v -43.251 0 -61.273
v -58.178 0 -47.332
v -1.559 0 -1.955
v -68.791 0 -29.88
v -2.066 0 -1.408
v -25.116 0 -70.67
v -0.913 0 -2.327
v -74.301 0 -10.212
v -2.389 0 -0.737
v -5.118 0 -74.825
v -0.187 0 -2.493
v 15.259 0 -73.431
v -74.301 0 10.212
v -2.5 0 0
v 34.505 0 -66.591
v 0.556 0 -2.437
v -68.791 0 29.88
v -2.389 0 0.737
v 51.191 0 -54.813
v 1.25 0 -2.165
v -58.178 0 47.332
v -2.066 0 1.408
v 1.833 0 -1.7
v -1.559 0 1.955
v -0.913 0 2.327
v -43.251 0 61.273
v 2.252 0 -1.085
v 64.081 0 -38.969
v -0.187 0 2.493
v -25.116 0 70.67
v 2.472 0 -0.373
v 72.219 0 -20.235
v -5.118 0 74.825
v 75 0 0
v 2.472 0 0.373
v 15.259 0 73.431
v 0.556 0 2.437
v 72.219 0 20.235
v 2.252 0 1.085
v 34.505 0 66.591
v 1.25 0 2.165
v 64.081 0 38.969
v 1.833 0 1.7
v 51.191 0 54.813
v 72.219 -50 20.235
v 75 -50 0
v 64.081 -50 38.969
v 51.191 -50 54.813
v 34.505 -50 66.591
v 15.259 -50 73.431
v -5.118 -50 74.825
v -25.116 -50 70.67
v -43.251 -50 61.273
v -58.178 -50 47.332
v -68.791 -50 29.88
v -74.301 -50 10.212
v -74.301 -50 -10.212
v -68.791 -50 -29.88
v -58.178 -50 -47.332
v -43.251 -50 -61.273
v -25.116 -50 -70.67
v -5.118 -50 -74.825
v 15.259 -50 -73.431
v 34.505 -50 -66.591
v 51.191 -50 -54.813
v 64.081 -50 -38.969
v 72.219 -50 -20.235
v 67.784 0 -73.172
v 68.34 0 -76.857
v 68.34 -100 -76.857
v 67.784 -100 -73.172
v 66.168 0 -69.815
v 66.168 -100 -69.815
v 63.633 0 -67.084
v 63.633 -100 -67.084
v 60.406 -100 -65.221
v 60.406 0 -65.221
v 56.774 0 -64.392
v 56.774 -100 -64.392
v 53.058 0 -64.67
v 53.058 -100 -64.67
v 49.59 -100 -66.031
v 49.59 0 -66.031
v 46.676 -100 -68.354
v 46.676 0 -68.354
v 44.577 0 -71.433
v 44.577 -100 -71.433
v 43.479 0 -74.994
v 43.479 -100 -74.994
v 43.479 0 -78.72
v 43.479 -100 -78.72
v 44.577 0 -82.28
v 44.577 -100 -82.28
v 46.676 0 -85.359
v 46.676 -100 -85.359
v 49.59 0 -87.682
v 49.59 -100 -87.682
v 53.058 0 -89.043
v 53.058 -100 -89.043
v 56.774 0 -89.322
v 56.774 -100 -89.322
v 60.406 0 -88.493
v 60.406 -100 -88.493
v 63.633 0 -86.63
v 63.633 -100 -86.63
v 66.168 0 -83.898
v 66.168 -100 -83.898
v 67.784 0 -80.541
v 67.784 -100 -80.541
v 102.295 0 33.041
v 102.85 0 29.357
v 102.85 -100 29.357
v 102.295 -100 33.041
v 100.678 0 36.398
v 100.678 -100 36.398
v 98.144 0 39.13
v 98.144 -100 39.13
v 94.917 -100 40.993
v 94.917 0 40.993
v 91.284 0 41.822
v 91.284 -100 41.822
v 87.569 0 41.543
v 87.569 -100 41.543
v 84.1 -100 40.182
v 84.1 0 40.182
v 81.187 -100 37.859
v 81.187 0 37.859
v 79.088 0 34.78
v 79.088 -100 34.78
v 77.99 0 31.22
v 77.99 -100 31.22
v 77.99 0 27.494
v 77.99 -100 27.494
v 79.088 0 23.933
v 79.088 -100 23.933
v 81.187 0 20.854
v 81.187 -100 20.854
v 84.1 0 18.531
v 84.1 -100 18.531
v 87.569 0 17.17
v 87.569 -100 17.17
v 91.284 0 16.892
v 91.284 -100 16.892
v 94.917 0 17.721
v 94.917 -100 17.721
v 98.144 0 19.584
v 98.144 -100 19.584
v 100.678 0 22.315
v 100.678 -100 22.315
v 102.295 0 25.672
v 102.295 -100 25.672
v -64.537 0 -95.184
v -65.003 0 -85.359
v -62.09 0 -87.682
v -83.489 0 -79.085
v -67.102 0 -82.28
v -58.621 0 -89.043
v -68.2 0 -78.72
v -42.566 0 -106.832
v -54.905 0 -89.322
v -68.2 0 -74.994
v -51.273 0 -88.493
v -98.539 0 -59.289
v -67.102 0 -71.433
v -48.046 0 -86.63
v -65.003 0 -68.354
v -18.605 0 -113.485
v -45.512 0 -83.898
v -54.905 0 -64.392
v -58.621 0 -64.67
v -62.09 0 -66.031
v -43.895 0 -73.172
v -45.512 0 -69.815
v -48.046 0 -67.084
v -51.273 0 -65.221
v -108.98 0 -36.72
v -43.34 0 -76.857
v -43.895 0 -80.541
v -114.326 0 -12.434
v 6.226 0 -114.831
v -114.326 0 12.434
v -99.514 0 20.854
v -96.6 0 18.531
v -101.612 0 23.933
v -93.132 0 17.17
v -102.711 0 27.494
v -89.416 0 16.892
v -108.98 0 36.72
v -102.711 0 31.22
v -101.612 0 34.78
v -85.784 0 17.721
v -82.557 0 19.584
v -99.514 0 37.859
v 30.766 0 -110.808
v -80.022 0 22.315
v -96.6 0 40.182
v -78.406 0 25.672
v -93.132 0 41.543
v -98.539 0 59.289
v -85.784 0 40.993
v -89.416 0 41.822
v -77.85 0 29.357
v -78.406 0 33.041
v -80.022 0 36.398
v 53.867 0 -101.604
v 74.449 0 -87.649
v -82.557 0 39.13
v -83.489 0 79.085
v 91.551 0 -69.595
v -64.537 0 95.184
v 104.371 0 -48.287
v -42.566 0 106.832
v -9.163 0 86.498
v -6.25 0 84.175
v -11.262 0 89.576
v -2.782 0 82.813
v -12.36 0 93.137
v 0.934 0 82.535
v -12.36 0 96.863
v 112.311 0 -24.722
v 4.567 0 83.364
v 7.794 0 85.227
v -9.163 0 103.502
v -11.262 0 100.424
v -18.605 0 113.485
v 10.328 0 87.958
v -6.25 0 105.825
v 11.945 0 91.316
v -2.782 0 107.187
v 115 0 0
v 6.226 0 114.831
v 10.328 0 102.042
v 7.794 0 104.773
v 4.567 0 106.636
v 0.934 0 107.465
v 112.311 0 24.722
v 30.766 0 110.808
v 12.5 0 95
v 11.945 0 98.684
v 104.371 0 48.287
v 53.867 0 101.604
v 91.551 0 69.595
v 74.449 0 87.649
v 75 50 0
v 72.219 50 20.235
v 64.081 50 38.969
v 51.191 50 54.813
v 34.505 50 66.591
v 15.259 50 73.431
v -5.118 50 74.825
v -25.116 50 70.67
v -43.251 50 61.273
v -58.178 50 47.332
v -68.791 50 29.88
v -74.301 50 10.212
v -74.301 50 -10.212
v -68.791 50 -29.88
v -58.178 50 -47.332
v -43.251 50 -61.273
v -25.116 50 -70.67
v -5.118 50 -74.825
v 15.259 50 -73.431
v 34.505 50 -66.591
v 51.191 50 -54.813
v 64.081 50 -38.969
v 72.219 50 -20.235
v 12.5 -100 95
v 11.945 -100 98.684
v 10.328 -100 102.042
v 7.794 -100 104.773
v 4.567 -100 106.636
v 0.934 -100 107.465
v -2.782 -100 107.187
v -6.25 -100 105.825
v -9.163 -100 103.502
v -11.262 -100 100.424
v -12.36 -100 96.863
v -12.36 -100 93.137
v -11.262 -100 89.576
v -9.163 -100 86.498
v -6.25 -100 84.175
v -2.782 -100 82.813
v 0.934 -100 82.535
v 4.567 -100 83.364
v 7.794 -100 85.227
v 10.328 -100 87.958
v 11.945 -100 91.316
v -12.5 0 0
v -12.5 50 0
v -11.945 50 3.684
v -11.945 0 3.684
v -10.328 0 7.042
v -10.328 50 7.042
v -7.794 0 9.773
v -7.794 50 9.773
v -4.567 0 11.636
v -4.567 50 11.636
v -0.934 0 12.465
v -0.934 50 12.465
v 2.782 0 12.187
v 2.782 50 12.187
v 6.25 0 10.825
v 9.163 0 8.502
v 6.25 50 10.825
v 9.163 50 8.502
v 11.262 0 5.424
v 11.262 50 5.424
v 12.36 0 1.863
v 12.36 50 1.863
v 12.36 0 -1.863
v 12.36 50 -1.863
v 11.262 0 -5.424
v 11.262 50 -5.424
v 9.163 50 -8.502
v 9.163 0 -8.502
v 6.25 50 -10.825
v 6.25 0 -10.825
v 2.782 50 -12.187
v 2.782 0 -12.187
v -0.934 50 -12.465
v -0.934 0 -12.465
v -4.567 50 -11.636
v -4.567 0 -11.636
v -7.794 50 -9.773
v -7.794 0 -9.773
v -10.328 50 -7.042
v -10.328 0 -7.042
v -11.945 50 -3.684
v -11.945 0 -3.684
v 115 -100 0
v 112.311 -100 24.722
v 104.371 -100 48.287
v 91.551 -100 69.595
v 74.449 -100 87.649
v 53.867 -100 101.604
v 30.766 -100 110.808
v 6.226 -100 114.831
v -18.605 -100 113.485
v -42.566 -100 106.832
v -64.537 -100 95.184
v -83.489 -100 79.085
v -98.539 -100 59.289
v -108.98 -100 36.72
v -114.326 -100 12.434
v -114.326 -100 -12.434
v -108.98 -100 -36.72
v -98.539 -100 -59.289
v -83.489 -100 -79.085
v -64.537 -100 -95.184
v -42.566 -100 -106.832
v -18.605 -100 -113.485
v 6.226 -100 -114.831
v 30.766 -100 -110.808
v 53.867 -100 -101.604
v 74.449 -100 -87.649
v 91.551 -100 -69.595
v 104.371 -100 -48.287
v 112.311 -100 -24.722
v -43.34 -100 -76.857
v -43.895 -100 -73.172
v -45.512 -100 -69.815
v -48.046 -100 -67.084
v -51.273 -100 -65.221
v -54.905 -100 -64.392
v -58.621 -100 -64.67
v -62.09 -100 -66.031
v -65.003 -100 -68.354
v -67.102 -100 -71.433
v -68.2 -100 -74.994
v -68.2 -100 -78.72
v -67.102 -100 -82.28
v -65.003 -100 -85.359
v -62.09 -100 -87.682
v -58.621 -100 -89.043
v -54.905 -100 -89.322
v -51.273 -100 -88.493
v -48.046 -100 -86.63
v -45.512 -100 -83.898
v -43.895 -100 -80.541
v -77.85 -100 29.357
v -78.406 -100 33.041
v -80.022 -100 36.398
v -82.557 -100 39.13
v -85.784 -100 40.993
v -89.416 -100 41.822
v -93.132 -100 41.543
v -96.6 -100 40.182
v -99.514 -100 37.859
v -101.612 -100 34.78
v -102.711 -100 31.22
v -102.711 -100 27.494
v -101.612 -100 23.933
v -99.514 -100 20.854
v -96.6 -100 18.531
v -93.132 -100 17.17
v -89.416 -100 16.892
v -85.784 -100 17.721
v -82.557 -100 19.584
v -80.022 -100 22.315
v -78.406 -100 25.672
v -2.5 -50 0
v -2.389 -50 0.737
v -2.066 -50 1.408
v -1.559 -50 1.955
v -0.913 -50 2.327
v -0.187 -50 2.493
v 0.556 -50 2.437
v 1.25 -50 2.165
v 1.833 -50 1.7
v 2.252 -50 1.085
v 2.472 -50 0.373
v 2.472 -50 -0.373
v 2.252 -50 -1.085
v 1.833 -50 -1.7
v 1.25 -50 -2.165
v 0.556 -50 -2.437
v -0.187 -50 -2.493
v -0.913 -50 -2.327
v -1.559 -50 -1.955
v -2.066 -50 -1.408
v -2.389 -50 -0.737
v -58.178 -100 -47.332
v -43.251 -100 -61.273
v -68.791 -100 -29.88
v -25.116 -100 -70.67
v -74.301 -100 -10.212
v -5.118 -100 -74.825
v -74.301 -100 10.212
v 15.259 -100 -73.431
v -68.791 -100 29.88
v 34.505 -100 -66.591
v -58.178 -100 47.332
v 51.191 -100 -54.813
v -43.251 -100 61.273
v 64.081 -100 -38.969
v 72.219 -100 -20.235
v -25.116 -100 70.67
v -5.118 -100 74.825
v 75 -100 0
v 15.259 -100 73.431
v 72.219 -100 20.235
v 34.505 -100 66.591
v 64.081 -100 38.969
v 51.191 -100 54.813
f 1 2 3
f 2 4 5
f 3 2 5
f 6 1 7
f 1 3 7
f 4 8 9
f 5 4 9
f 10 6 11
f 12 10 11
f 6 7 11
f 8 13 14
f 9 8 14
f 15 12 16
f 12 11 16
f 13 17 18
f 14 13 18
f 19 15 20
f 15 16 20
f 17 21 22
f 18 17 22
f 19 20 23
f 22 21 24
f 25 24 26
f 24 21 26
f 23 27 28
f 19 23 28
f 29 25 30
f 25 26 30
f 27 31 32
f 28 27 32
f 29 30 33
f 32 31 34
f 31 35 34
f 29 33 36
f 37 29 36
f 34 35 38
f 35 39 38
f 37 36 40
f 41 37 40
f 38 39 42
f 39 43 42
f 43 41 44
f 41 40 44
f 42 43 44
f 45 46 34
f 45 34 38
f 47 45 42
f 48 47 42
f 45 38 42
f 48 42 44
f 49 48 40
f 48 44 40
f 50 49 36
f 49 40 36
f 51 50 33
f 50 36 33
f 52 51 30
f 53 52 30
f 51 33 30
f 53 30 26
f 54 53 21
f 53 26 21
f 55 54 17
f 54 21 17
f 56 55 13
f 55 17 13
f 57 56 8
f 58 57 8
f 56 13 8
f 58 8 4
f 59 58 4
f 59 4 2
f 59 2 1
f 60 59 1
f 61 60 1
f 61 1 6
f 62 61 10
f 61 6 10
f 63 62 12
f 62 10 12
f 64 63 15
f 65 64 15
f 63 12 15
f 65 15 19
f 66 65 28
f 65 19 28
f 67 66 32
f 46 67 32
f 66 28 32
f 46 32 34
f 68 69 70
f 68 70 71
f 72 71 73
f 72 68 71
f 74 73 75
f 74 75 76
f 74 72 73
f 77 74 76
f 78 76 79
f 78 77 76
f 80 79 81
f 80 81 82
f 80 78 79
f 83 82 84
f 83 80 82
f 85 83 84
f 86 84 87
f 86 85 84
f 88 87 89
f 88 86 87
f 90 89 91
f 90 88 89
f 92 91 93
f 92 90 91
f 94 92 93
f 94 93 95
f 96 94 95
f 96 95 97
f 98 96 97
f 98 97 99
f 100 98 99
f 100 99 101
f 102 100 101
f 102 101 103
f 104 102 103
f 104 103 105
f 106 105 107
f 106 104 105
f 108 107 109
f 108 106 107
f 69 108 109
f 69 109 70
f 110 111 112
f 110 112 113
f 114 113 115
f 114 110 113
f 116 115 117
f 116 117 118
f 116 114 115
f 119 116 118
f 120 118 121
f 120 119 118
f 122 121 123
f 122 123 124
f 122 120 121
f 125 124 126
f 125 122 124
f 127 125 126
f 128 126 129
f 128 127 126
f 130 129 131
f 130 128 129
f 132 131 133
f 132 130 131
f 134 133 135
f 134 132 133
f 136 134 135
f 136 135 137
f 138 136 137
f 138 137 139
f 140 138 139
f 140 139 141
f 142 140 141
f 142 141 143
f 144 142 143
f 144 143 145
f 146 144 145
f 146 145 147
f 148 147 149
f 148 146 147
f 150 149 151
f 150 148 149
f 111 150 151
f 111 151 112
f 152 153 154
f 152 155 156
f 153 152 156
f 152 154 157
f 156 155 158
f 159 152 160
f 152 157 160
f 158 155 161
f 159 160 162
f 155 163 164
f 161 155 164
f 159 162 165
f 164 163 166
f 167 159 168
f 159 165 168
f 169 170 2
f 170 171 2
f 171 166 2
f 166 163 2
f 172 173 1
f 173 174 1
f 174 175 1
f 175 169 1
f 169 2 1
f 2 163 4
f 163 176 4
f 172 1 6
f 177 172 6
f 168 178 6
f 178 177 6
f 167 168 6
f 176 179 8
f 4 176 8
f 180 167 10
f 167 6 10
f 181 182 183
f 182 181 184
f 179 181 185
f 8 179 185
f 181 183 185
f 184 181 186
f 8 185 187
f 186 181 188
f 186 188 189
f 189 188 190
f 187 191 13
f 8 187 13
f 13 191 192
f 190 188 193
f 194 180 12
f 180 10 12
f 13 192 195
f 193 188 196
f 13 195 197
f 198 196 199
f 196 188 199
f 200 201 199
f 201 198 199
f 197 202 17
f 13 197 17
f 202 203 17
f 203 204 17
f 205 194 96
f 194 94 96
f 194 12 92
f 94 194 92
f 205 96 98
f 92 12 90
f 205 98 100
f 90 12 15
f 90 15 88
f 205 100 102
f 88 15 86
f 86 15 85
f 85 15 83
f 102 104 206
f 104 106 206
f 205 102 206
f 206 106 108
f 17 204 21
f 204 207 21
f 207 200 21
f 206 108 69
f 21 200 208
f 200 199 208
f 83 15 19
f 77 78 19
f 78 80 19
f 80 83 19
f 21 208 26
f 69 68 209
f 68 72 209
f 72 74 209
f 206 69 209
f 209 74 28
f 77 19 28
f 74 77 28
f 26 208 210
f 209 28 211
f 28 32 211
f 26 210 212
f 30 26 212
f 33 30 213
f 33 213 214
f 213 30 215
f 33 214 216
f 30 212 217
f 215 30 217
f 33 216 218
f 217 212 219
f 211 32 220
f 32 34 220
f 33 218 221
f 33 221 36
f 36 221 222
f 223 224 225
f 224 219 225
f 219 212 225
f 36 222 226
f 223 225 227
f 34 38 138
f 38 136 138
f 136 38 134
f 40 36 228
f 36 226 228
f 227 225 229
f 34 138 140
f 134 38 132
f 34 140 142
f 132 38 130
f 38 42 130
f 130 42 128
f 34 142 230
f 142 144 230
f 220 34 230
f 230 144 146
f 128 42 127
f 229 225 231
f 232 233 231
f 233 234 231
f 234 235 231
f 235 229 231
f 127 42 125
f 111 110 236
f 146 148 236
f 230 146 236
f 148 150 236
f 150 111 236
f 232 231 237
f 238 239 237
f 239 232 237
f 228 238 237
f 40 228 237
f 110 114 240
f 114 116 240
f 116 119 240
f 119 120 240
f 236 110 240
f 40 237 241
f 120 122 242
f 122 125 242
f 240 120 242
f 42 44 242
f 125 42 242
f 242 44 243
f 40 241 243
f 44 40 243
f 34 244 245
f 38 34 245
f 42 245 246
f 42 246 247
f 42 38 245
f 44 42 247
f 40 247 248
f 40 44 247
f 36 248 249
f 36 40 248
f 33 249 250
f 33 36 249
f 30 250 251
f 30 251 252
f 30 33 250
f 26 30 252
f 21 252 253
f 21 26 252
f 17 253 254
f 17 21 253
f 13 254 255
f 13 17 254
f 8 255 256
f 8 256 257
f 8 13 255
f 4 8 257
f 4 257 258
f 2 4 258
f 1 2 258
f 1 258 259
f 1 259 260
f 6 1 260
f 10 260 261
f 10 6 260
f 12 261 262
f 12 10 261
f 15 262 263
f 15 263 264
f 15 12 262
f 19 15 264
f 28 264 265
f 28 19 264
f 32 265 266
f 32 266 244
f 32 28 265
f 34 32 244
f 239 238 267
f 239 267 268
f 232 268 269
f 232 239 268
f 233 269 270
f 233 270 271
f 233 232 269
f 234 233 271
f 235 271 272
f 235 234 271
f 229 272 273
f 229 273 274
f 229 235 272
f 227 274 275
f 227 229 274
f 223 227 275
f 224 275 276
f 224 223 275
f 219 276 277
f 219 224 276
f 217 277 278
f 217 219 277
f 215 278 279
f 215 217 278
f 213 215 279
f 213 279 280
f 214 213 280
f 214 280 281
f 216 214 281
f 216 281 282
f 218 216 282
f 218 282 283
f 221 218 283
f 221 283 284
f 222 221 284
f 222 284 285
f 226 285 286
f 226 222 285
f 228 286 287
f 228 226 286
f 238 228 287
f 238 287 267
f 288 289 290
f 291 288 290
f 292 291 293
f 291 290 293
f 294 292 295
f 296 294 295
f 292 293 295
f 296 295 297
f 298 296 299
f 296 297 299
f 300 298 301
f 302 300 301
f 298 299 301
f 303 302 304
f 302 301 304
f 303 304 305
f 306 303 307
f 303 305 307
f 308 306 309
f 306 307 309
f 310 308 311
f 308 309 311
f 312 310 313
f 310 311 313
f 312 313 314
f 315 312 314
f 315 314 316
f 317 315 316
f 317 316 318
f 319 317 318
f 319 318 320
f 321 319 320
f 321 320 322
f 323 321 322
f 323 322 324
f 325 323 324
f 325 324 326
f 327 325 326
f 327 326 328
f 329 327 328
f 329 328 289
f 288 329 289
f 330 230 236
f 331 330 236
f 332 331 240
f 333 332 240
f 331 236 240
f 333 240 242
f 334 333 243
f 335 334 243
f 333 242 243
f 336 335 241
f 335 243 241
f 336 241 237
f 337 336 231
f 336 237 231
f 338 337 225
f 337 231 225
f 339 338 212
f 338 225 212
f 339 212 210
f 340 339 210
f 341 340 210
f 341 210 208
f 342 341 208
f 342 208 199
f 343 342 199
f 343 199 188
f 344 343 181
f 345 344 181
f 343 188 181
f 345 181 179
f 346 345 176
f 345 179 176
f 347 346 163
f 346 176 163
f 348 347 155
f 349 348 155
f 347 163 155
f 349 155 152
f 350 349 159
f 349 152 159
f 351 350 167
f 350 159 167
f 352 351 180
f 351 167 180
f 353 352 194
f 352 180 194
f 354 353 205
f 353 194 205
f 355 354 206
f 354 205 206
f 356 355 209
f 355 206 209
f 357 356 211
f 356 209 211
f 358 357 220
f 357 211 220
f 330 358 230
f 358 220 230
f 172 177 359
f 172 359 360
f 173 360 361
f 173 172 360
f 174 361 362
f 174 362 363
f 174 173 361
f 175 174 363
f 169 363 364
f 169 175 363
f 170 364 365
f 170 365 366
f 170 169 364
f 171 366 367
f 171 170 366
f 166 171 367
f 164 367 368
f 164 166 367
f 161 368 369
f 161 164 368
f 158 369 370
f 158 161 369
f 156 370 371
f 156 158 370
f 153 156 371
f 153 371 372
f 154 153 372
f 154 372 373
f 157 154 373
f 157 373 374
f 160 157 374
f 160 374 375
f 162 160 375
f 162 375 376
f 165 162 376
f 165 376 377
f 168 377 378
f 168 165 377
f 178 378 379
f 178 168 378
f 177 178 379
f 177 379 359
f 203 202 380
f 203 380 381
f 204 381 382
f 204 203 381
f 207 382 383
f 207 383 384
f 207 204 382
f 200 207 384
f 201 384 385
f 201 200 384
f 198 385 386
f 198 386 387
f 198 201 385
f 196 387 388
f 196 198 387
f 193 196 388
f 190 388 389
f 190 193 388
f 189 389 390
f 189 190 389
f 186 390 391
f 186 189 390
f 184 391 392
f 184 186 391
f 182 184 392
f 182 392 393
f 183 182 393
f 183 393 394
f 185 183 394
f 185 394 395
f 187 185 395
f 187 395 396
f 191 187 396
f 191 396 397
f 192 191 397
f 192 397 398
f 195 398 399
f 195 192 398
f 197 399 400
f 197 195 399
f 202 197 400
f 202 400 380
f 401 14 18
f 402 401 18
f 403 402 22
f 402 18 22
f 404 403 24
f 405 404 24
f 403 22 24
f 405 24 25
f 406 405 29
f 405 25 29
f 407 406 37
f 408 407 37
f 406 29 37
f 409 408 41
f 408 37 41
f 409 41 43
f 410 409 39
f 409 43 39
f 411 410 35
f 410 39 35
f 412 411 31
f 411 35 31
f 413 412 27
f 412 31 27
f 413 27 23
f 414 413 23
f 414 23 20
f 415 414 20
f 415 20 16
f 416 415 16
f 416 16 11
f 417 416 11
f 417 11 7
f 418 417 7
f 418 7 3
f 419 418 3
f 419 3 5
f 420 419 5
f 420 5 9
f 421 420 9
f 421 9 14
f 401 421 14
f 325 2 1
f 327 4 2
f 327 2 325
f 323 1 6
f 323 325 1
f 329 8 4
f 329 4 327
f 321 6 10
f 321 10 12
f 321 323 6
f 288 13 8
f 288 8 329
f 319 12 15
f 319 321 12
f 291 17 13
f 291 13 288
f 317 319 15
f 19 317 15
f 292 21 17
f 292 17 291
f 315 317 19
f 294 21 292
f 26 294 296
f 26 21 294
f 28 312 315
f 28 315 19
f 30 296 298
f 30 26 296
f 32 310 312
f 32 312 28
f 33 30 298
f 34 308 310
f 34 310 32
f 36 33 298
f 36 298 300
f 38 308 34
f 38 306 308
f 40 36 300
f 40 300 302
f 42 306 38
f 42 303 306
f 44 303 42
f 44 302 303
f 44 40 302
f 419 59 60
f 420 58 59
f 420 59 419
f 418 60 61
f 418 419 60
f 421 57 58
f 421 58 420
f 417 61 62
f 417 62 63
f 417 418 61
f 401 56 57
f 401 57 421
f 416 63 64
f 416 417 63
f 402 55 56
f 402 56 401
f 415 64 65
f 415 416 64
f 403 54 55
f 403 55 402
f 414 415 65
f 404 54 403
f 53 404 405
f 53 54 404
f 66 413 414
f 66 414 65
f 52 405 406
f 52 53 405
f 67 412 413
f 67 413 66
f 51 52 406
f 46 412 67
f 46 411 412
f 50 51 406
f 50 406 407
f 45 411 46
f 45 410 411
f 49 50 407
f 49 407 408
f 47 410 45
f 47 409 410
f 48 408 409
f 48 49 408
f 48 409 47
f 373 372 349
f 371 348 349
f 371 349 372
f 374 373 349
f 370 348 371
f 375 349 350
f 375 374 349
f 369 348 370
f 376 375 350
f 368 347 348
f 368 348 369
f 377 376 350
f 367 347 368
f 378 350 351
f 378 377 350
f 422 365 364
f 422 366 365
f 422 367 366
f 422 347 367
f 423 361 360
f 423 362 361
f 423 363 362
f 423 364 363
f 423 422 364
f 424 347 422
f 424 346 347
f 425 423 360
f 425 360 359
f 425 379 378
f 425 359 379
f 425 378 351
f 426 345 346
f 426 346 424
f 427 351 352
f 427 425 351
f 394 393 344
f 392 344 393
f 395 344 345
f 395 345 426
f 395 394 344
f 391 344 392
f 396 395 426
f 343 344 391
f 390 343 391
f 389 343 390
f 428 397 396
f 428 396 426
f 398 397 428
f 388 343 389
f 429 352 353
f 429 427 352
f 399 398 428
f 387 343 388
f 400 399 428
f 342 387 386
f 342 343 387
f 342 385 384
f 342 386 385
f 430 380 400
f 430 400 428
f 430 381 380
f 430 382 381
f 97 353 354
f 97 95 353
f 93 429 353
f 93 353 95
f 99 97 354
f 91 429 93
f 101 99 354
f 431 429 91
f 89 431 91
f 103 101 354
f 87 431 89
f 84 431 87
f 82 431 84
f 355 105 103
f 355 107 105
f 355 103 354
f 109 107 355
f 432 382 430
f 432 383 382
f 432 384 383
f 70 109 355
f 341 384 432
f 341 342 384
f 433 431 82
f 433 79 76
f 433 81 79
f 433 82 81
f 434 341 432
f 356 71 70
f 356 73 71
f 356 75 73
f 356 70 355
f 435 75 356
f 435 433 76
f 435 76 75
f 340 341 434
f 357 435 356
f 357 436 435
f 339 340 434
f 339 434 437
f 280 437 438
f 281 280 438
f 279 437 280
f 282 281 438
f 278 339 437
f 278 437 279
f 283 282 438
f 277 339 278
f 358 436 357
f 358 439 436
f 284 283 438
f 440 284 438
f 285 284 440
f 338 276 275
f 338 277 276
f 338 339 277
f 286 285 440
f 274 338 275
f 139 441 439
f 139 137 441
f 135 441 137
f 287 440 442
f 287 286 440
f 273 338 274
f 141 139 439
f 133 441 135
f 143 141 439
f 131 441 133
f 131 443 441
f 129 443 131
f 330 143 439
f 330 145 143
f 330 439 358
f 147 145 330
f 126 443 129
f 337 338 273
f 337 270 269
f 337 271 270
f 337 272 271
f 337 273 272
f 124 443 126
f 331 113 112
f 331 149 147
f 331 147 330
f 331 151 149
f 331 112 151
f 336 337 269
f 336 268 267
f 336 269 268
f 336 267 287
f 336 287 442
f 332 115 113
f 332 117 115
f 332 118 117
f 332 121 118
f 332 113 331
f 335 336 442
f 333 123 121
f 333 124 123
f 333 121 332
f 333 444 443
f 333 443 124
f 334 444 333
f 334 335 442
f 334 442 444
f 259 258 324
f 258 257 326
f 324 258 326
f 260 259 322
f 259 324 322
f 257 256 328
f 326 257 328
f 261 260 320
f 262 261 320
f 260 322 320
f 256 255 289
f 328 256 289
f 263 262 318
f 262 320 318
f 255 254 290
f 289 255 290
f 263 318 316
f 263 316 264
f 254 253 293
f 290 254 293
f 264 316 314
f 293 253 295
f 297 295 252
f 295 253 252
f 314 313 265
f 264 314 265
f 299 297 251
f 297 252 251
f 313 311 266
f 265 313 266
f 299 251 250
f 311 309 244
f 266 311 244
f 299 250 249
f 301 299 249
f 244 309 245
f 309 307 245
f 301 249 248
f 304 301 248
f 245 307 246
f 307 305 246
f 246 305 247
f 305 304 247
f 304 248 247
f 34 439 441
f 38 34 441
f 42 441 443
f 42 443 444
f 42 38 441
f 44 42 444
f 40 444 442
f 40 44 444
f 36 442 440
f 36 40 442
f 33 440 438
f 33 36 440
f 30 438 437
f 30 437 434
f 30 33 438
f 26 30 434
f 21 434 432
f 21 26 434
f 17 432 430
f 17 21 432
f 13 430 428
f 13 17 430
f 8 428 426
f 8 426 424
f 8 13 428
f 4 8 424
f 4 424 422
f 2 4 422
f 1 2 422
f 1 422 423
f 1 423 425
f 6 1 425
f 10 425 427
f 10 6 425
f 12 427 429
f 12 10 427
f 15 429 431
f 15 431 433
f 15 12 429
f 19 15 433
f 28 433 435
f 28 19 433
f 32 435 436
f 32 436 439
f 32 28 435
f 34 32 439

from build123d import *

# Parameters (mm, degrees)
F0_R     = 115
F0_R_2   = 12.5
F0_R_3   = 75
F1_DEPTH = 100
F2_DEPTH = 50
F3_DEPTH = 50
F4_R     = 12.5
F5_DEPTH = 25
F6_DEPTH = 99
F7_R     = 2.5
F8_DEPTH = 150.001


with BuildPart() as f1:
    # F0 (on Front) → F1 (new body)
    with BuildSketch(Plane.XZ):
        Circle(F0_R)
        with Locations((-55.8395989678, -76.8566144656)):
            Circle(F0_R_2, mode=Mode.SUBTRACT)
        with Locations((55.8395989678, -76.8566144656)):
            Circle(F0_R_2, mode=Mode.SUBTRACT)
        with Locations((-90.350369048, 29.3566144656)):
            Circle(F0_R_2, mode=Mode.SUBTRACT)
        Circle(F0_R_3, mode=Mode.SUBTRACT)
        with Locations((90.350369048, 29.3566144656)):
            Circle(F0_R_2, mode=Mode.SUBTRACT)
        with Locations((0, 95)):
            Circle(F0_R_2, mode=Mode.SUBTRACT)
    extrude(amount=F1_DEPTH)

    # F4 (on face) → F5 (cut)
    with BuildSketch(Plane(origin=(0, 50, 0), x_dir=(-1, 0, 0), z_dir=(0, 1, 0))):
        Circle(F4_R)
    extrude(amount=F5_DEPTH, mode=Mode.SUBTRACT)


with BuildPart() as f2:
    # F0 (on Front) → F2 (new body)
    with BuildSketch(Plane.XZ):
        Circle(F0_R_3)
    extrude(amount=-F2_DEPTH)

    # F4 (on face) → F6 (cut)
    with BuildSketch(Plane(origin=(0, 50, 0), x_dir=(-1, 0, 0), z_dir=(0, 1, 0))):
        Circle(F4_R)
    extrude(amount=-F6_DEPTH, mode=Mode.SUBTRACT)


with BuildPart() as f3:
    # F0 (on Front) → F3 (new body)
    with BuildSketch(Plane.XZ):
        Circle(F0_R_3)
    extrude(amount=F3_DEPTH)

    # F7 (on face) → F8 (cut, through all)
    with BuildSketch(Plane(origin=(0, 50, 0), x_dir=(-1, 0, 0), z_dir=(0, 1, 0))):
        Circle(F7_R)
    extrude(amount=-F8_DEPTH, mode=Mode.SUBTRACT)


solid = Compound([f1.part, f2.part, f3.part])
